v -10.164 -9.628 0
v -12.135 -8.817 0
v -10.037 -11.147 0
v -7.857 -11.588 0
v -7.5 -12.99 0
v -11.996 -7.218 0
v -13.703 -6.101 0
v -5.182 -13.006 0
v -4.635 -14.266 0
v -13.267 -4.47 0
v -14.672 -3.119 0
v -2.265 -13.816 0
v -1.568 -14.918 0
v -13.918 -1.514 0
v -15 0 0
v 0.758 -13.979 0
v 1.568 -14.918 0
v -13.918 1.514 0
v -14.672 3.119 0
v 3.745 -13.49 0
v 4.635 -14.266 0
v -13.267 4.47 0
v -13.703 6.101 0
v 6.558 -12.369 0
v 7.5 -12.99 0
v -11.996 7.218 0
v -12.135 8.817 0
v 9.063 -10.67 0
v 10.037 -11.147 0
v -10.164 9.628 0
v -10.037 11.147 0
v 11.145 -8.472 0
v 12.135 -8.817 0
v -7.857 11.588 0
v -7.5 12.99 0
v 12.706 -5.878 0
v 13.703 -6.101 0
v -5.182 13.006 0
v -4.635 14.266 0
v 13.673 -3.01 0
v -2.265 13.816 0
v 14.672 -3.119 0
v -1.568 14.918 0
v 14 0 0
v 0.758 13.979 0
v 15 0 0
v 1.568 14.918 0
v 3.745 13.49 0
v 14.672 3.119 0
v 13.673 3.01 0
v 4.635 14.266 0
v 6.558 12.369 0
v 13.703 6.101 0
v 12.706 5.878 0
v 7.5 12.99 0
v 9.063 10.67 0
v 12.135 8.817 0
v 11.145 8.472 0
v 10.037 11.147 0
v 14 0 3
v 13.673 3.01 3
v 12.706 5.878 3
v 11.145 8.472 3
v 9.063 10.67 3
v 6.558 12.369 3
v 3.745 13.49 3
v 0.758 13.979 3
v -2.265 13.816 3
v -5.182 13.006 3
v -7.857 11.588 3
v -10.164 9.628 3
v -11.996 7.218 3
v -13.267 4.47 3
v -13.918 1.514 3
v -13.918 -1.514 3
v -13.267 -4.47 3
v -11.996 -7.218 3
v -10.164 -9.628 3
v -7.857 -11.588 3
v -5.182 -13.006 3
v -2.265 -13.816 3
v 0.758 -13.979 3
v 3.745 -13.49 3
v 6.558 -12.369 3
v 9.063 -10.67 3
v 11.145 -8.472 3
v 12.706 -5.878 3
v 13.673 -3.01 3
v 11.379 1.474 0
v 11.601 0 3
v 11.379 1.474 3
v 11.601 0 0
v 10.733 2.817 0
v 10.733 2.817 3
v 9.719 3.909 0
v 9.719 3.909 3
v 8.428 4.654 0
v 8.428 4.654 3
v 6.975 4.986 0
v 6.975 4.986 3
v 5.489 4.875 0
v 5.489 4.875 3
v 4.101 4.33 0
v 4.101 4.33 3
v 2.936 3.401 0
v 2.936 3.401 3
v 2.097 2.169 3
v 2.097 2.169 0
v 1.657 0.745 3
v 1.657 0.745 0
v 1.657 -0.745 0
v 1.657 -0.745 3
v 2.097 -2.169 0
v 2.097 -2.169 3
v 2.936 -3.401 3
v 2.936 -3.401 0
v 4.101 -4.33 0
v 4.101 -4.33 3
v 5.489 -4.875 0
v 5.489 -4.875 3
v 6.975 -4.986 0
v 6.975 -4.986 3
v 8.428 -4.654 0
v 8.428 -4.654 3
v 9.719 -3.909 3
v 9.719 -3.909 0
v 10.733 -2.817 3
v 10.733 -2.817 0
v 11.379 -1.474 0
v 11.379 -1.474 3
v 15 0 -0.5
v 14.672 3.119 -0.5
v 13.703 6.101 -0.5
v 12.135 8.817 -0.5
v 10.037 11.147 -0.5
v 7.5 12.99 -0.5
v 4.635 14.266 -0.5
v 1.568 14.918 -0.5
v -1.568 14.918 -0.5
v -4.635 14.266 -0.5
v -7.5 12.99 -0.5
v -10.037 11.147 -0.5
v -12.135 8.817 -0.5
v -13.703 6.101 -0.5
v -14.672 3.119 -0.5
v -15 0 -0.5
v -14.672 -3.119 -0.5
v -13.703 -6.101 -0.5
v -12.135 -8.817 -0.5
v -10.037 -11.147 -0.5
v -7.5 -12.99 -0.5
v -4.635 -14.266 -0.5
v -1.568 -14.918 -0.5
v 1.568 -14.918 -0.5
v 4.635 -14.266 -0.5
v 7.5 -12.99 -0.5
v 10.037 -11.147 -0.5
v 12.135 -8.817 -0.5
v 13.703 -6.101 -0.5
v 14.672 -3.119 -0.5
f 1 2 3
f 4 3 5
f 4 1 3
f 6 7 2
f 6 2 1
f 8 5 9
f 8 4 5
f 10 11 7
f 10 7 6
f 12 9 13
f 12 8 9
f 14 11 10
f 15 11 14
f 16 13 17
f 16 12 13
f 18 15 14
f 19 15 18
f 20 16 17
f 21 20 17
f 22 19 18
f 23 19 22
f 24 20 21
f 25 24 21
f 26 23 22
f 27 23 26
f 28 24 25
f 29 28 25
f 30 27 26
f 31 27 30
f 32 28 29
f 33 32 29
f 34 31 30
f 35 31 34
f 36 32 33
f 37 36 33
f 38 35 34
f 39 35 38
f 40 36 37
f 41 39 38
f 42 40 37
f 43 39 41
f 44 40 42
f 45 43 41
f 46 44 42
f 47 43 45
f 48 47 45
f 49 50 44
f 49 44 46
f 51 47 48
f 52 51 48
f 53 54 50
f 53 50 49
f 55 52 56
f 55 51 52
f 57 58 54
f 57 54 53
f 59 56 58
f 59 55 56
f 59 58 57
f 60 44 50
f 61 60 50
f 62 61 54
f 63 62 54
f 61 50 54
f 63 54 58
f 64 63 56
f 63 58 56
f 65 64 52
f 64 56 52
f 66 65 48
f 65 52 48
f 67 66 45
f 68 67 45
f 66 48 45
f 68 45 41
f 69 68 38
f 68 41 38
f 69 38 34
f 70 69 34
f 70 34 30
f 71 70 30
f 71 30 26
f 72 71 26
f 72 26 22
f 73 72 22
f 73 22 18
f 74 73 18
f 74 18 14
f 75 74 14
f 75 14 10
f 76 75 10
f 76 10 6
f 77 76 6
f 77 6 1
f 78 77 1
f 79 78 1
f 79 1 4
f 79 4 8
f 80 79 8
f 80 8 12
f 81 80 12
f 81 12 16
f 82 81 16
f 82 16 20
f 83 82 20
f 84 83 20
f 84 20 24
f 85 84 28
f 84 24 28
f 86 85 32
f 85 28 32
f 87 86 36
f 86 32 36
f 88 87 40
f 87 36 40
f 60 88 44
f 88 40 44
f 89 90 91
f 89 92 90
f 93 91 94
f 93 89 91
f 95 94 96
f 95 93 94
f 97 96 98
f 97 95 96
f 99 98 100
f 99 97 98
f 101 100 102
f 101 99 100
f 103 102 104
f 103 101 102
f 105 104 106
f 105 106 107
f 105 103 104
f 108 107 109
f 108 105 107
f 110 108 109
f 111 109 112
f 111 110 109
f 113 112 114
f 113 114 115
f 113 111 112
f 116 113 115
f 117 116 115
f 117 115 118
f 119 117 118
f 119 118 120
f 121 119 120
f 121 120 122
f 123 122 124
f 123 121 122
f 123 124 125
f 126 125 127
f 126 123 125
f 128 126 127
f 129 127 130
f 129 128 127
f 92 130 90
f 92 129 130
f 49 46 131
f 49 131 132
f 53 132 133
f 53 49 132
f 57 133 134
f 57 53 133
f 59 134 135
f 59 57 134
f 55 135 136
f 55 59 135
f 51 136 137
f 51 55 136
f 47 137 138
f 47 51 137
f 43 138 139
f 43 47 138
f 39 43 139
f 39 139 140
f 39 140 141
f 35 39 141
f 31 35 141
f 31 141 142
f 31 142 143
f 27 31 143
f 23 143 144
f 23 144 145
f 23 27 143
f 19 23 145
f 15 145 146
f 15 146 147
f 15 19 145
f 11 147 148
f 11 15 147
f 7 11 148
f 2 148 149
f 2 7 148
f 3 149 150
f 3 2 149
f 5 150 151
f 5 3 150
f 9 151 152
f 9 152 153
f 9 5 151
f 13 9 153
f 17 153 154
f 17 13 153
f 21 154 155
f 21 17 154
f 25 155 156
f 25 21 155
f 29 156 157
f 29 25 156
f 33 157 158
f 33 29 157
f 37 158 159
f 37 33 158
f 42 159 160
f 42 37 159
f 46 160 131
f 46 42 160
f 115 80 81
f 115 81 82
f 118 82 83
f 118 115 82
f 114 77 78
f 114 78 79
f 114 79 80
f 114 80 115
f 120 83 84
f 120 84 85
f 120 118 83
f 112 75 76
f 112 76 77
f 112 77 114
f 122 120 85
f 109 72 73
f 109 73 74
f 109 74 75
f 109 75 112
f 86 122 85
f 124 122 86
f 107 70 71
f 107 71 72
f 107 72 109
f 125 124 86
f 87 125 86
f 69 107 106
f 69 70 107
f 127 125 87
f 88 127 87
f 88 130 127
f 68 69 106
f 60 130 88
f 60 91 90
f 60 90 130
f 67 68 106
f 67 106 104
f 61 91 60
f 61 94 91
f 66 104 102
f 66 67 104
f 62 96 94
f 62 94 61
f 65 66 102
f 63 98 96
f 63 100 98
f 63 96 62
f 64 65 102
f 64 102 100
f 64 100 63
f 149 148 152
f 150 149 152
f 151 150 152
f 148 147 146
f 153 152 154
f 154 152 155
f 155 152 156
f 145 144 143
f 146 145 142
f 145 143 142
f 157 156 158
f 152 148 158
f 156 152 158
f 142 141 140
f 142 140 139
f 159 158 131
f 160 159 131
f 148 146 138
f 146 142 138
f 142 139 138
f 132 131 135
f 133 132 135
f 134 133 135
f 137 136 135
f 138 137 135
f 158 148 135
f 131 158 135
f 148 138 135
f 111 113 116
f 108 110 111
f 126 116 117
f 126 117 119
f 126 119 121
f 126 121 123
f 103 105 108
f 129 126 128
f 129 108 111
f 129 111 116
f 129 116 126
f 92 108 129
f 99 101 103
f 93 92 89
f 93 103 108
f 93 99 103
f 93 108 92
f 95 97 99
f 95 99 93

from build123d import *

# Parameters (mm, degrees)
F0_R        = 14
F0_R_2      = 5
F1_DEPTH    = 3
F0_R_3      = 15
F1_FACE_R   = 14
F1_FACE_R_2 = 5
F2_DEPTH    = 0.5


with BuildPart() as f1:
    # F0 (on Top) → F1 (new body)
    with BuildSketch(Plane.XY):
        Circle(F0_R)
        with Locations((6.601435598, 0)):
            Circle(F0_R_2, mode=Mode.SUBTRACT)
    extrude(amount=F1_DEPTH)

    # F0 (on Top) + F1_face (on face) → F2 (join)
    with BuildSketch(Plane.XY):
        Circle(F0_R_3)
        Circle(F0_R, mode=Mode.SUBTRACT)
        Circle(F0_R)
        with Locations((6.601435598, 0)):
            Circle(F0_R_2, mode=Mode.SUBTRACT)
        with Locations((6.601435598, 0)):
            Circle(F0_R_2)
    with BuildSketch(Plane(origin=(-0.9651221634, 0, 3), x_dir=(1, 0, 0), z_dir=(0, 0, 1))):
        with Locations((0.9651221634, 0)):
            Circle(F1_FACE_R)
        with Locations((7.5665577614, 0)):
            Circle(F1_FACE_R_2, mode=Mode.SUBTRACT)
    extrude(amount=-F2_DEPTH)


solid = f1.part
